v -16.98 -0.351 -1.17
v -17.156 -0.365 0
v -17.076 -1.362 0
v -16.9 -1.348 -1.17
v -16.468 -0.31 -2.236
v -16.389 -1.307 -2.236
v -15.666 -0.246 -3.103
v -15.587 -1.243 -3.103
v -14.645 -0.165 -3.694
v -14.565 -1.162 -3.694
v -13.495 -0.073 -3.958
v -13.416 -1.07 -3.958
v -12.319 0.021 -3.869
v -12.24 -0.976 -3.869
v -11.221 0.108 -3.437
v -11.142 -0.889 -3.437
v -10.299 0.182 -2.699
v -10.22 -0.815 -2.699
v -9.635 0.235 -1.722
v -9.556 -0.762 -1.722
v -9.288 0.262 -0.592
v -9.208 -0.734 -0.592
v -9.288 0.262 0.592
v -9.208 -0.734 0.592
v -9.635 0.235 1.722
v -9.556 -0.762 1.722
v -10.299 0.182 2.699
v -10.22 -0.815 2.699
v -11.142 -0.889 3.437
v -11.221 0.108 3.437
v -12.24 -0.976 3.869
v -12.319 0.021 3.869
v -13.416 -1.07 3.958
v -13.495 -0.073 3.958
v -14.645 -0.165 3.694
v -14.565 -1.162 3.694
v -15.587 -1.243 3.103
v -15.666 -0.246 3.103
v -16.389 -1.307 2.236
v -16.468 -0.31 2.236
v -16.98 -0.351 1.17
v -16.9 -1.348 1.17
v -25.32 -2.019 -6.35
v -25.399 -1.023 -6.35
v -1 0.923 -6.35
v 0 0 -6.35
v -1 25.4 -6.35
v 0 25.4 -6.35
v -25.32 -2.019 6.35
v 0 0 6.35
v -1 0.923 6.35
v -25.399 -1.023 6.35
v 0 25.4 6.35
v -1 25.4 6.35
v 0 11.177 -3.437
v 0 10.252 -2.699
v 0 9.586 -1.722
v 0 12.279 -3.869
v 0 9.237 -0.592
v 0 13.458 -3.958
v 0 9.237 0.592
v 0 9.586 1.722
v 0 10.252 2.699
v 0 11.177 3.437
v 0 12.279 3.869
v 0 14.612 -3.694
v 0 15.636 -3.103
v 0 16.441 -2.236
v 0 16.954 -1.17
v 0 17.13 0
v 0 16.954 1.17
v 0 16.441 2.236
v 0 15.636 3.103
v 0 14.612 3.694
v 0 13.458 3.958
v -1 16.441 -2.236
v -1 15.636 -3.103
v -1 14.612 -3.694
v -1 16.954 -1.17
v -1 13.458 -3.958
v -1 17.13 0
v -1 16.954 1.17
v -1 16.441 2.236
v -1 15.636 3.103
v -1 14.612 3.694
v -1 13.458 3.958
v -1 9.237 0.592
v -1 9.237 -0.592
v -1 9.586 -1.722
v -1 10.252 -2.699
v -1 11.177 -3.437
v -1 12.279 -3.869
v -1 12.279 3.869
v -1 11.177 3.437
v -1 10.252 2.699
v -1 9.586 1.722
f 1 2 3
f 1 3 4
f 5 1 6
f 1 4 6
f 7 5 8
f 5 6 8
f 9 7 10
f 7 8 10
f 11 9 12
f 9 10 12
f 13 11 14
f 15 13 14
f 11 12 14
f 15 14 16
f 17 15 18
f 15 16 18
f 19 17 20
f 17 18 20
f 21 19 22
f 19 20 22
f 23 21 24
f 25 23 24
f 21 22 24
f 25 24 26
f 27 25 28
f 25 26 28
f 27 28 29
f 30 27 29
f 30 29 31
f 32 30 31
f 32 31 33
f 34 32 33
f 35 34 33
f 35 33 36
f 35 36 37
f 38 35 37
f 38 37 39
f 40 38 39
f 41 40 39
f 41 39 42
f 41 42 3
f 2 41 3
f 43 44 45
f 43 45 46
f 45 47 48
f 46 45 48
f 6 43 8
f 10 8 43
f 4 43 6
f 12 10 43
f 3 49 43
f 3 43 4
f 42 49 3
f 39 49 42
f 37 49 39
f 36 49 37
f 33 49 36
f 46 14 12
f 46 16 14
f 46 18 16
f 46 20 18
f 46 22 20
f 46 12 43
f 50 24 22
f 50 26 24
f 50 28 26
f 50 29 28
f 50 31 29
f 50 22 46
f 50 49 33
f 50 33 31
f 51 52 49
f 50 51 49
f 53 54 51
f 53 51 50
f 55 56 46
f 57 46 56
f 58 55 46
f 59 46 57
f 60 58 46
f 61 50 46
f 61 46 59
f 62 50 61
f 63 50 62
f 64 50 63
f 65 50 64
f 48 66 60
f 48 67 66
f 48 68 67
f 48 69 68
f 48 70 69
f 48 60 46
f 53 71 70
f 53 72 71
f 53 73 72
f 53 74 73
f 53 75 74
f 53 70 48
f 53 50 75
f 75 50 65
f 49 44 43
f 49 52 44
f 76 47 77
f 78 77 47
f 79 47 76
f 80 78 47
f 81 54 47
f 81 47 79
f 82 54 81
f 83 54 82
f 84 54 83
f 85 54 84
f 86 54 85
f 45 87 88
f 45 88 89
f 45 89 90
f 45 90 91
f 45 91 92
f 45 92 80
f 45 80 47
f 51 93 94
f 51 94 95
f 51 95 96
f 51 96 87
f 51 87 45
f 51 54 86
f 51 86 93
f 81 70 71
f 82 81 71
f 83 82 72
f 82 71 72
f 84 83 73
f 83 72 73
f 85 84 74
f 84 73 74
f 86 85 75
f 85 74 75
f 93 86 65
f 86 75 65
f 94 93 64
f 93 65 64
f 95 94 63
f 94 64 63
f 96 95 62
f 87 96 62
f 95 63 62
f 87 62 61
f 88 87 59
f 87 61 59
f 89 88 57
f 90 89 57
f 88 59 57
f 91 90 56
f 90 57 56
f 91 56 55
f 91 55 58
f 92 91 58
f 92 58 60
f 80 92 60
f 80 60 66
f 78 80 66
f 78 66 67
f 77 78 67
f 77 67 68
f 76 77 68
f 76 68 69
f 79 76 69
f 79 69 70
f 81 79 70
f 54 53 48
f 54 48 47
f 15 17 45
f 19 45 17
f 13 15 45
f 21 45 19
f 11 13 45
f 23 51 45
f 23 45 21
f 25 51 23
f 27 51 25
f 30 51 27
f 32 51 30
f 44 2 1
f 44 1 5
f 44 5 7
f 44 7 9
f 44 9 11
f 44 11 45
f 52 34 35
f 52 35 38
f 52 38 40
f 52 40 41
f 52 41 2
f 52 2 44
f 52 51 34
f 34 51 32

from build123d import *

# Parameters (mm, degrees)
BOSS_EXTRUDE1_DEPTH            = 6.35
F_5_16_0_3125_DIAMETER_HOLE1_D = 7.9375
F_5_16_0_3125_DIAMETER_HOLE2_D = 7.9375


with BuildPart() as part:
    # Sketch1 → Boss-Extrude1 (new body, symmetric)
    with BuildSketch(Plane.XY):
        Polygon((0, 0), (0, 25.4), (-1, 25.4), (-1, 0.923419949), (-25.399102496, -1.022542132), (-25.319599474, -2.019376756), align=None)
    extrude(amount=BOSS_EXTRUDE1_DEPTH, both=True)

    # 5/16 (0.3125) Diameter Hole1 (through all)
    with Locations(Plane(origin=(-1, 13.161709974, 0), x_dir=(0, -1, 0), z_dir=(-1, 0, 0))):
        with Locations((0, 0)):
            Hole(F_5_16_0_3125_DIAMETER_HOLE1_D / 2)

    # 5/16 (0.3125) Diameter Hole2 (through all)
    with Locations(Plane(origin=(-13.199551248, -0.049561091, 0), x_dir=(0.996834625, 0.079503022, 0), z_dir=(-0.079503022, 0.996834625, 0))):
        with Locations((0, 0)):
            Hole(F_5_16_0_3125_DIAMETER_HOLE2_D / 2)


solid = part.part
